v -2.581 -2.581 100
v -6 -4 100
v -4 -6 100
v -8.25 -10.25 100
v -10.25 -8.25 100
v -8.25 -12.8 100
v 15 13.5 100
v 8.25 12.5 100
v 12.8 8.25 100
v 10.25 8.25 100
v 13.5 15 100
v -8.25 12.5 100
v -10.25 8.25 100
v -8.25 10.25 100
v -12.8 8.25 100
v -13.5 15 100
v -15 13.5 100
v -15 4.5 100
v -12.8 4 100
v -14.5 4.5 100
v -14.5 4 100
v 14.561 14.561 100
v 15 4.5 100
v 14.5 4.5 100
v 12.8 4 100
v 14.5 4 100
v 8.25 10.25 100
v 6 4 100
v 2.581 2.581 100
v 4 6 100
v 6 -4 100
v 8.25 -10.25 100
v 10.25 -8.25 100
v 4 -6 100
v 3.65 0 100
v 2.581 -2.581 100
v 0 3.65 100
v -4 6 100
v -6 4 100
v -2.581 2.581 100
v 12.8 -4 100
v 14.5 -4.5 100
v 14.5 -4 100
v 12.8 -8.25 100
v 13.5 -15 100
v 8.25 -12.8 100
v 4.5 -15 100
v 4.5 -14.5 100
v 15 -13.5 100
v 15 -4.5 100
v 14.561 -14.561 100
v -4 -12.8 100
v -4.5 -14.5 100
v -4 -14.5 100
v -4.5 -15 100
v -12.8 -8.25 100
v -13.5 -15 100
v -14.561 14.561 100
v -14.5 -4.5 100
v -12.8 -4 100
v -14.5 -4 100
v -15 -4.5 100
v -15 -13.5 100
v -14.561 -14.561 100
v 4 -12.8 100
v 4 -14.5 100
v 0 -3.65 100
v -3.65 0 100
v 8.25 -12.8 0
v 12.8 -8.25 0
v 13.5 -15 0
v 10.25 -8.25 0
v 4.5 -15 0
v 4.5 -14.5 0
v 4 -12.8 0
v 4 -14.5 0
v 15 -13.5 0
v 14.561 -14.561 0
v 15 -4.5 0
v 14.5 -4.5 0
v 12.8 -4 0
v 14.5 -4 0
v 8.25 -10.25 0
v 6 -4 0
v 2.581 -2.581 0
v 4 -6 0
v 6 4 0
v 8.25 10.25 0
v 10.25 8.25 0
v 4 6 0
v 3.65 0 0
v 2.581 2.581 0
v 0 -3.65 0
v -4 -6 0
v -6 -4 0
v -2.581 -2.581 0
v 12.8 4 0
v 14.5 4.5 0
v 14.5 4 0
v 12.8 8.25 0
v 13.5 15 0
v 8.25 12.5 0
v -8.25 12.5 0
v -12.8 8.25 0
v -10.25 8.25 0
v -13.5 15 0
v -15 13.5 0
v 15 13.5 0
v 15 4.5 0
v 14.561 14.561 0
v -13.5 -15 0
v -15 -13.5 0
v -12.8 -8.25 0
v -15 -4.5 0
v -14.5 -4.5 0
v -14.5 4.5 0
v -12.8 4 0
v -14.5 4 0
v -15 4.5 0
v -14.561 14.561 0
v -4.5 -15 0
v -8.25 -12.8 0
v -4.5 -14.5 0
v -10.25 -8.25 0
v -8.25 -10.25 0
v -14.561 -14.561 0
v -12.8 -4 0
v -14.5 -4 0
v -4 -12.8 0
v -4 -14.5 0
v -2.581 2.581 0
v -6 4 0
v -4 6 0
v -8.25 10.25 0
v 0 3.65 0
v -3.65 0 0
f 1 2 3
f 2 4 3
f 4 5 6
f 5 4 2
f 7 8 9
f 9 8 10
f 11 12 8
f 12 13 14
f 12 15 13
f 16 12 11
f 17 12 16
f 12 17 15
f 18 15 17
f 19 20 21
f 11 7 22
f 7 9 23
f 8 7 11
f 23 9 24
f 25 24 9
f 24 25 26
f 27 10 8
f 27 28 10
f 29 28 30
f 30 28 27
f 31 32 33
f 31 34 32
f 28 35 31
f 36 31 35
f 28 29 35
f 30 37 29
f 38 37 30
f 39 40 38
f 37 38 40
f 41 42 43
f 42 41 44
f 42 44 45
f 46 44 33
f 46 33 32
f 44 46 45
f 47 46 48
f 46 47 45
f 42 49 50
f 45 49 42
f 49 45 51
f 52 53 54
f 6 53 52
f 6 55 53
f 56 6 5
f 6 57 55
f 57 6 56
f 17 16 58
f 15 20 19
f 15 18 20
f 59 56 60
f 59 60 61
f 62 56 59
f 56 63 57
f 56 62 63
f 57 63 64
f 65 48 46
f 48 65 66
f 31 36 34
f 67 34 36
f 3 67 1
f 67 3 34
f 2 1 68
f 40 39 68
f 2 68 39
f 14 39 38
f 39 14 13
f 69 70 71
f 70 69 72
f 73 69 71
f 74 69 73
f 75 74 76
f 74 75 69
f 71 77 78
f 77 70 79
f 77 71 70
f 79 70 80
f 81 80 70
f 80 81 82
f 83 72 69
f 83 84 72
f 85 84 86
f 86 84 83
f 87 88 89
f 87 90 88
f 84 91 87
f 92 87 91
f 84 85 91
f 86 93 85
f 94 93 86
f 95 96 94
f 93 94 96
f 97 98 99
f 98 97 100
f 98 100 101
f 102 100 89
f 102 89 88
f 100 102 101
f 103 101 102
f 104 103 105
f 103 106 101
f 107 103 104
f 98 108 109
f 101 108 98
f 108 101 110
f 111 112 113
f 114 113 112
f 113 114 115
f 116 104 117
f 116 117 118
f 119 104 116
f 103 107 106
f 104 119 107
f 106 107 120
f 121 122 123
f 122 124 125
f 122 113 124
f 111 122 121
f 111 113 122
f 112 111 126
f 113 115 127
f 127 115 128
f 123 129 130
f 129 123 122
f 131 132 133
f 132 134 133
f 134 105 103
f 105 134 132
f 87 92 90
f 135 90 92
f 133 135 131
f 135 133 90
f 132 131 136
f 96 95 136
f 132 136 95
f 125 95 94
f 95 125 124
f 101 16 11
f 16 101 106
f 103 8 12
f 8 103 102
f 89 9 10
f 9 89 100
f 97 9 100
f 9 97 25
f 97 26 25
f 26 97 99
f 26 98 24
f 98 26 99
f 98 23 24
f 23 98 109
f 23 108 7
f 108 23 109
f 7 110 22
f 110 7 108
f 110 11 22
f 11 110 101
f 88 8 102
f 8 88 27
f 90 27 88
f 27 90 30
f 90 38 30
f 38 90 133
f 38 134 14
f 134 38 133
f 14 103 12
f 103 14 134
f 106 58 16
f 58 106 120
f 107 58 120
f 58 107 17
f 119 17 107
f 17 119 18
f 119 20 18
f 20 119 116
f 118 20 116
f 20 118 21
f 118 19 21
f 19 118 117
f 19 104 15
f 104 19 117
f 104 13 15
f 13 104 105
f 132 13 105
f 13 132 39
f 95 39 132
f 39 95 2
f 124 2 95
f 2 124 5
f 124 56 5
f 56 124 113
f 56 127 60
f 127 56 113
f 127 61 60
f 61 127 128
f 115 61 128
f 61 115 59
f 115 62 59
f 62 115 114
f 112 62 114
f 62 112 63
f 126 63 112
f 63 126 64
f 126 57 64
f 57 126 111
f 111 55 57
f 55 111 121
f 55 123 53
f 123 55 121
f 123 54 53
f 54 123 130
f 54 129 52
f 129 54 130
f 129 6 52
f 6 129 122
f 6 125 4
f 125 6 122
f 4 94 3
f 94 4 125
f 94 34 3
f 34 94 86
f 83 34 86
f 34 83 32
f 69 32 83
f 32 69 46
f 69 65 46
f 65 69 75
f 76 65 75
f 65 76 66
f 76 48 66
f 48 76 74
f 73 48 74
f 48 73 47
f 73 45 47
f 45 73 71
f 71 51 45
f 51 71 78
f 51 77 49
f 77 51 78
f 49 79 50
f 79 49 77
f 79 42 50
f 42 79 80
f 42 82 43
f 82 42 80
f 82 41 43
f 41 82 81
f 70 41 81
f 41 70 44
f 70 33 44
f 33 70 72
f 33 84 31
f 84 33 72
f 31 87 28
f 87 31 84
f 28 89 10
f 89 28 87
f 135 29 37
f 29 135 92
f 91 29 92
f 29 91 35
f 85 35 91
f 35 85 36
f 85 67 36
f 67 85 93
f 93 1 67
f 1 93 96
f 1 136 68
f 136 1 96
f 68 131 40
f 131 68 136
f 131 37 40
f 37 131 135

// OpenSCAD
// Aleksandr Saechnikov 09 june 2015
ALU_profile_1N(height=100, size=30);

module ALU_profile_1N(size=30, height=10, radius=1.5, step=0.5) {

	linear_extrude(height=height) {
		union() {
			sub_extrusion_profile(size, radius, step);
			rotate([0,0,90])  sub_extrusion_profile(size, radius, step);
			rotate([0,0,180]) sub_extrusion_profile(size, radius, step);
			rotate([0,0,270]) sub_extrusion_profile(size, radius, step);
		}
	}
    difference() {
        translate([0, 0, height/2])
            cube([size-radius*2, size, height], center=true);

        translate([0, -2.5, height/2])
            cube([size, size, height], center=true);
        }
    
    module sub_extrusion_profile(size=30, radius = 1.5, step=0.5) {

        reSize = size/30; // Scalling

        k0 = 0;
        k2 = 3.65*reSize;
        k1 = k2*cos(45);

        k3 = 4*reSize;
        k4 = 6*reSize;
        k5 = 8.25*reSize; k5_2 = k5 + k4 - k3;
        k6 = 12.8*reSize;
        k7 = 15*reSize;

        _radius = radius;// OR  *reSize -- Corner radius
        _step = step;    // OR  *reSize -- Step size

        polygon(points=[
            [k1,k1],[0,k2], // Center hole
            [0,k4],[k3,k4],[k5,k5_2],[k5,k6],[k3,k6],
            [k3,k7-_step],[k3+_step,k7-_step],[k3+_step,k7], //Step
            [k7-_radius,k7],[k7-_radius*(1.-cos(45)),k7-_radius*(1.-cos(45))],[k7,k7-_radius],// Corner
            [k7,k3+_step],[k7-_step,k3+_step],[k7-_step,k3], // Step
            [k6,k3],[k6,k5],[k5_2,k5],[k4,k3],[k4,0],
            [k2,0]  // Center hole
        ]);
    }
}
